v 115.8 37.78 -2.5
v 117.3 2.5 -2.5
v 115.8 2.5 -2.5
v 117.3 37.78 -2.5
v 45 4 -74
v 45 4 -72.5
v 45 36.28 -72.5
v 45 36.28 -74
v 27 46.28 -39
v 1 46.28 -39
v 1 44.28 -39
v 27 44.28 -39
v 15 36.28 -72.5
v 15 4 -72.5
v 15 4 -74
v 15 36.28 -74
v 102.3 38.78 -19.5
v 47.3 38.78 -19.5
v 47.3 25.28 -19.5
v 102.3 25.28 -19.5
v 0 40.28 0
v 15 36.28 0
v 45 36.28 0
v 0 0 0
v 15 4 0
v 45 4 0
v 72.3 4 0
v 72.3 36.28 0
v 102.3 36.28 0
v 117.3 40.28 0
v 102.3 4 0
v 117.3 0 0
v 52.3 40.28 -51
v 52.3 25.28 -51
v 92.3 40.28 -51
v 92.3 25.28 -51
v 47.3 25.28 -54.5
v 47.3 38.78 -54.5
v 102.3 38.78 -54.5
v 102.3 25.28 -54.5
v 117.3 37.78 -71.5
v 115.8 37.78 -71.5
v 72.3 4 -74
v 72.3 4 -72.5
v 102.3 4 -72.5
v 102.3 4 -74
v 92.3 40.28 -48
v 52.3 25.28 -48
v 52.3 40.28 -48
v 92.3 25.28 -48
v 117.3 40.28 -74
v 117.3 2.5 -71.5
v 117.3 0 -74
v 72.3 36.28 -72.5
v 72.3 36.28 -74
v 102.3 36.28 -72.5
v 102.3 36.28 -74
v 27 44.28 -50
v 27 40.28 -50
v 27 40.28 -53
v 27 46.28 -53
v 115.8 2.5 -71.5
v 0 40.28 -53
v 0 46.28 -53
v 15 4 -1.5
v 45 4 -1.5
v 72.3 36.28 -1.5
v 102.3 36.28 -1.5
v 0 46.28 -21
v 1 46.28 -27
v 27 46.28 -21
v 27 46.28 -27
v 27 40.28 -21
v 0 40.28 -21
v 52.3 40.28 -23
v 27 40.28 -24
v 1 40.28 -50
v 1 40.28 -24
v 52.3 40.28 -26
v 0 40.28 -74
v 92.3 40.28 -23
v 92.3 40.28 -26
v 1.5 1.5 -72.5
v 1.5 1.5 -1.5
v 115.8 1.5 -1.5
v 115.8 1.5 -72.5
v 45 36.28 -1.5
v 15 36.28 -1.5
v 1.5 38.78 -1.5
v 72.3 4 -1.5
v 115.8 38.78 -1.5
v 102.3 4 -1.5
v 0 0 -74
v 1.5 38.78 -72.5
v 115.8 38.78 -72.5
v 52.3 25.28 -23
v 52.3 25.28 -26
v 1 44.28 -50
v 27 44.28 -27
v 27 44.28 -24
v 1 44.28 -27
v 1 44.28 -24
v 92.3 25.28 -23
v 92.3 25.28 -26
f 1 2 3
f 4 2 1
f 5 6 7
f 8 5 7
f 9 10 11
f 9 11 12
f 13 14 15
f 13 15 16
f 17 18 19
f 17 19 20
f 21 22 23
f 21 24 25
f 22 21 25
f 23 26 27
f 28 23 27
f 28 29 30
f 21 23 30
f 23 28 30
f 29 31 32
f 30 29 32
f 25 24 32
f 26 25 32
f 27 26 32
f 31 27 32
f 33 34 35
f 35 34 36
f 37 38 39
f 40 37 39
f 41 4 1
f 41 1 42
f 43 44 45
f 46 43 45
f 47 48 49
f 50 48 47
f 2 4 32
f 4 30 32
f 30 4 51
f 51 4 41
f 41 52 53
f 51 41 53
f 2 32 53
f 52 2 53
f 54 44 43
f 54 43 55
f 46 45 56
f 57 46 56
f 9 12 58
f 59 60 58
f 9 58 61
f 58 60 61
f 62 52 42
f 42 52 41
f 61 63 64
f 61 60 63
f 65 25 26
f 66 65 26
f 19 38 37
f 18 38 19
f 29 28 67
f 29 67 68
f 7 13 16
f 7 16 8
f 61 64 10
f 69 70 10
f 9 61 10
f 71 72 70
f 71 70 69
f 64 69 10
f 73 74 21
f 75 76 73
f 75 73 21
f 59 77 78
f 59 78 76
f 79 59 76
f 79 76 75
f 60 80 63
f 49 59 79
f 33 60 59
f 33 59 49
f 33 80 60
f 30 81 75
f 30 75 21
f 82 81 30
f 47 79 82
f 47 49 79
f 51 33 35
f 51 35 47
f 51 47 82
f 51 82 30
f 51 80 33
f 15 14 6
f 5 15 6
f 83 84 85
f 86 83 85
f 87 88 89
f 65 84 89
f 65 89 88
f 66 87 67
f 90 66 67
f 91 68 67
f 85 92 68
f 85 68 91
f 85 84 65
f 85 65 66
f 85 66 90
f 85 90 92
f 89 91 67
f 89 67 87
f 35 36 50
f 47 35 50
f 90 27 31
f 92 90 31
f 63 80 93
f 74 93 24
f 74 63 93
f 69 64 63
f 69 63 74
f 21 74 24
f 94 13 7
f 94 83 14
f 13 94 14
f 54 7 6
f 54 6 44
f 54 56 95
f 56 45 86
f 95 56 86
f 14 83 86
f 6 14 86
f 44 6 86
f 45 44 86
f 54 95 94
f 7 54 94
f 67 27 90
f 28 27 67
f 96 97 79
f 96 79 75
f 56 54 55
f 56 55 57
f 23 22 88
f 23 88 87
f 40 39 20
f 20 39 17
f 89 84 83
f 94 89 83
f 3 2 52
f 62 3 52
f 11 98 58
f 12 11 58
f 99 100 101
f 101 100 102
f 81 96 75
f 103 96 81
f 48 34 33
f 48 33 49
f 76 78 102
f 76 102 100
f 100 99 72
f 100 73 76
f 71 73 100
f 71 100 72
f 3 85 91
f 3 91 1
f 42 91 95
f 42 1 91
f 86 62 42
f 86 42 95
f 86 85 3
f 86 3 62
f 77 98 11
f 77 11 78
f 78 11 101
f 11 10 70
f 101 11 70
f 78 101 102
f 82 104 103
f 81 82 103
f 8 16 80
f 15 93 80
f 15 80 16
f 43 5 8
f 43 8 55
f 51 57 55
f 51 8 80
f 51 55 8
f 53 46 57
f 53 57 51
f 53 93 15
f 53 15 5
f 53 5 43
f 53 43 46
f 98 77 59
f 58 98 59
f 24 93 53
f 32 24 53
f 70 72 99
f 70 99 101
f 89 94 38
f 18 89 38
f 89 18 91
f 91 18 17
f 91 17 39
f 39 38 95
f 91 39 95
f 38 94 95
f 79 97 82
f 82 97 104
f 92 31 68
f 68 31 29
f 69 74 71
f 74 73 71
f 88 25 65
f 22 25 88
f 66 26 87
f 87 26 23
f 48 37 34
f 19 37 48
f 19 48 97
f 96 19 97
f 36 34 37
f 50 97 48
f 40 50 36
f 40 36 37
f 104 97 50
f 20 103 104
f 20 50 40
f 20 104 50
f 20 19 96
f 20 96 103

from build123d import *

# Parameters (mm, degrees)
SKETCH1_W            = 117.3
SKETCH1_H            = 74
SKETCH1_W_2          = 114.3
SKETCH1_H_2          = 71
BOSS_EXTRUDE1_DEPTH  = 40.28
SKETCH5_W            = 117.3
SKETCH5_H            = 74
BOSS_EXTRUDE3_DEPTH  = 1.5
SKETCH7_W            = 69
SKETCH7_H            = 35.28
CUT_EXTRUDE3_DEPTH   = 2
SKETCH8_W            = 117.3
SKETCH8_H            = 74
BOSS_EXTRUDE4_DEPTH  = 1.5
SKETCH9_W            = 26
SKETCH9_H            = 3
BOSS_EXTRUDE5_DEPTH  = 6
SKETCH10_W           = 26
SKETCH10_H           = 2
BOSS_EXTRUDE6_DEPTH  = 11
SKETCH11_W           = 26
SKETCH11_H           = 2
BOSS_EXTRUDE7_DEPTH  = 3
SKETCH12_W           = 32
SKETCH12_H           = 6
BOSS_EXTRUDE8_DEPTH  = 1
SKETCH19_W           = 30
SKETCH19_H           = 32.28
CUT_EXTRUDE6_DEPTH   = 147.209193965
SKETCH20_W           = 55
SKETCH20_H           = 35
BOSS_EXTRUDE10_DEPTH = 13.5
SKETCH22_W           = 40
SKETCH22_H           = 3
CUT_EXTRUDE7_DEPTH   = 141.976481727


with BuildPart() as part:
    # Sketch1 → Boss-Extrude1 (new body)
    with BuildSketch(Plane(origin=(0, 0, 0), x_dir=(1, 0, 0), z_dir=(0, 1, 0))):
        with Locations((58.65, 37)):
            Rectangle(SKETCH1_W, SKETCH1_H)
        with Locations((58.65, 37)):
            Rectangle(SKETCH1_W_2, SKETCH1_H_2, mode=Mode.SUBTRACT)
    extrude(amount=BOSS_EXTRUDE1_DEPTH)

    # Sketch5 → Boss-Extrude3 (add)
    with BuildSketch(Plane.XZ):
        with Locations((58.65, -37)):
            Rectangle(SKETCH5_W, SKETCH5_H)
    extrude(amount=-BOSS_EXTRUDE3_DEPTH)

    # Sketch7 → Cut-Extrude3 (cut)
    with BuildSketch(Plane(origin=(117.3, 0, 0), x_dir=(0, 0, -1), z_dir=(1, 0, 0))):
        with Locations((37, 20.14)):
            Rectangle(SKETCH7_W, SKETCH7_H)
    extrude(amount=-CUT_EXTRUDE3_DEPTH, mode=Mode.SUBTRACT)

    # Sketch8 → Boss-Extrude4 (add)
    with BuildSketch(Plane(origin=(0, 40.28, 0), x_dir=(1, 0, 0), z_dir=(0, 1, 0))):
        with Locations((58.65, 37)):
            Rectangle(SKETCH8_W, SKETCH8_H)
    extrude(amount=-BOSS_EXTRUDE4_DEPTH)

    # Sketch9 → Boss-Extrude5 (add)
    with BuildSketch(Plane(origin=(0, 40.28, 0), x_dir=(1, 0, 0), z_dir=(0, 1, 0))):
        with Locations((14, 51.5)):
            Rectangle(SKETCH9_W, SKETCH9_H)
        with Locations((14, 22.5)):
            Rectangle(SKETCH9_W, SKETCH9_H)
    extrude(amount=BOSS_EXTRUDE5_DEPTH)

    # Sketch10 → Boss-Extrude6 (add)
    with BuildSketch(Plane.XY.offset(-50)):
        with Locations((14, 45.28)):
            Rectangle(SKETCH10_W, SKETCH10_H)
    extrude(amount=BOSS_EXTRUDE6_DEPTH)

    # Sketch11 → Boss-Extrude7 (add)
    with BuildSketch(Plane(origin=(0, 0, -24), x_dir=(-1, 0, 0), z_dir=(0, 0, -1))):
        with Locations((-14, 45.28)):
            Rectangle(SKETCH11_W, SKETCH11_H)
    extrude(amount=BOSS_EXTRUDE7_DEPTH)

    # Sketch12 → Boss-Extrude8 (add)
    with BuildSketch(Plane.ZY.offset(-1)):
        with Locations((-37, 43.28)):
            Rectangle(SKETCH12_W, SKETCH12_H)
    extrude(amount=BOSS_EXTRUDE8_DEPTH)

    # Sketch19 → Cut-Extrude6 (cut, through all)
    with BuildSketch(Plane.XY):
        with Locations((30, 20.14)):
            Rectangle(SKETCH19_W, SKETCH19_H)
        with Locations((87.3, 20.14)):
            Rectangle(SKETCH19_W, SKETCH19_H)
    extrude(amount=-CUT_EXTRUDE6_DEPTH, mode=Mode.SUBTRACT)

    # Sketch20 → Boss-Extrude10 (add)
    with BuildSketch(Plane.XZ.offset(-38.78)):
        with Locations((74.8, -37)):
            Rectangle(SKETCH20_W, SKETCH20_H)
    extrude(amount=BOSS_EXTRUDE10_DEPTH)

    # Sketch22 → Cut-Extrude7 (cut, through all)
    with BuildSketch(Plane.XZ.offset(-25.28)):
        with Locations((72.3, -24.5)):
            Rectangle(SKETCH22_W, SKETCH22_H)
        with Locations((72.3, -49.5)):
            Rectangle(SKETCH22_W, SKETCH22_H)
    extrude(amount=-CUT_EXTRUDE7_DEPTH, mode=Mode.SUBTRACT)


solid = part.part
